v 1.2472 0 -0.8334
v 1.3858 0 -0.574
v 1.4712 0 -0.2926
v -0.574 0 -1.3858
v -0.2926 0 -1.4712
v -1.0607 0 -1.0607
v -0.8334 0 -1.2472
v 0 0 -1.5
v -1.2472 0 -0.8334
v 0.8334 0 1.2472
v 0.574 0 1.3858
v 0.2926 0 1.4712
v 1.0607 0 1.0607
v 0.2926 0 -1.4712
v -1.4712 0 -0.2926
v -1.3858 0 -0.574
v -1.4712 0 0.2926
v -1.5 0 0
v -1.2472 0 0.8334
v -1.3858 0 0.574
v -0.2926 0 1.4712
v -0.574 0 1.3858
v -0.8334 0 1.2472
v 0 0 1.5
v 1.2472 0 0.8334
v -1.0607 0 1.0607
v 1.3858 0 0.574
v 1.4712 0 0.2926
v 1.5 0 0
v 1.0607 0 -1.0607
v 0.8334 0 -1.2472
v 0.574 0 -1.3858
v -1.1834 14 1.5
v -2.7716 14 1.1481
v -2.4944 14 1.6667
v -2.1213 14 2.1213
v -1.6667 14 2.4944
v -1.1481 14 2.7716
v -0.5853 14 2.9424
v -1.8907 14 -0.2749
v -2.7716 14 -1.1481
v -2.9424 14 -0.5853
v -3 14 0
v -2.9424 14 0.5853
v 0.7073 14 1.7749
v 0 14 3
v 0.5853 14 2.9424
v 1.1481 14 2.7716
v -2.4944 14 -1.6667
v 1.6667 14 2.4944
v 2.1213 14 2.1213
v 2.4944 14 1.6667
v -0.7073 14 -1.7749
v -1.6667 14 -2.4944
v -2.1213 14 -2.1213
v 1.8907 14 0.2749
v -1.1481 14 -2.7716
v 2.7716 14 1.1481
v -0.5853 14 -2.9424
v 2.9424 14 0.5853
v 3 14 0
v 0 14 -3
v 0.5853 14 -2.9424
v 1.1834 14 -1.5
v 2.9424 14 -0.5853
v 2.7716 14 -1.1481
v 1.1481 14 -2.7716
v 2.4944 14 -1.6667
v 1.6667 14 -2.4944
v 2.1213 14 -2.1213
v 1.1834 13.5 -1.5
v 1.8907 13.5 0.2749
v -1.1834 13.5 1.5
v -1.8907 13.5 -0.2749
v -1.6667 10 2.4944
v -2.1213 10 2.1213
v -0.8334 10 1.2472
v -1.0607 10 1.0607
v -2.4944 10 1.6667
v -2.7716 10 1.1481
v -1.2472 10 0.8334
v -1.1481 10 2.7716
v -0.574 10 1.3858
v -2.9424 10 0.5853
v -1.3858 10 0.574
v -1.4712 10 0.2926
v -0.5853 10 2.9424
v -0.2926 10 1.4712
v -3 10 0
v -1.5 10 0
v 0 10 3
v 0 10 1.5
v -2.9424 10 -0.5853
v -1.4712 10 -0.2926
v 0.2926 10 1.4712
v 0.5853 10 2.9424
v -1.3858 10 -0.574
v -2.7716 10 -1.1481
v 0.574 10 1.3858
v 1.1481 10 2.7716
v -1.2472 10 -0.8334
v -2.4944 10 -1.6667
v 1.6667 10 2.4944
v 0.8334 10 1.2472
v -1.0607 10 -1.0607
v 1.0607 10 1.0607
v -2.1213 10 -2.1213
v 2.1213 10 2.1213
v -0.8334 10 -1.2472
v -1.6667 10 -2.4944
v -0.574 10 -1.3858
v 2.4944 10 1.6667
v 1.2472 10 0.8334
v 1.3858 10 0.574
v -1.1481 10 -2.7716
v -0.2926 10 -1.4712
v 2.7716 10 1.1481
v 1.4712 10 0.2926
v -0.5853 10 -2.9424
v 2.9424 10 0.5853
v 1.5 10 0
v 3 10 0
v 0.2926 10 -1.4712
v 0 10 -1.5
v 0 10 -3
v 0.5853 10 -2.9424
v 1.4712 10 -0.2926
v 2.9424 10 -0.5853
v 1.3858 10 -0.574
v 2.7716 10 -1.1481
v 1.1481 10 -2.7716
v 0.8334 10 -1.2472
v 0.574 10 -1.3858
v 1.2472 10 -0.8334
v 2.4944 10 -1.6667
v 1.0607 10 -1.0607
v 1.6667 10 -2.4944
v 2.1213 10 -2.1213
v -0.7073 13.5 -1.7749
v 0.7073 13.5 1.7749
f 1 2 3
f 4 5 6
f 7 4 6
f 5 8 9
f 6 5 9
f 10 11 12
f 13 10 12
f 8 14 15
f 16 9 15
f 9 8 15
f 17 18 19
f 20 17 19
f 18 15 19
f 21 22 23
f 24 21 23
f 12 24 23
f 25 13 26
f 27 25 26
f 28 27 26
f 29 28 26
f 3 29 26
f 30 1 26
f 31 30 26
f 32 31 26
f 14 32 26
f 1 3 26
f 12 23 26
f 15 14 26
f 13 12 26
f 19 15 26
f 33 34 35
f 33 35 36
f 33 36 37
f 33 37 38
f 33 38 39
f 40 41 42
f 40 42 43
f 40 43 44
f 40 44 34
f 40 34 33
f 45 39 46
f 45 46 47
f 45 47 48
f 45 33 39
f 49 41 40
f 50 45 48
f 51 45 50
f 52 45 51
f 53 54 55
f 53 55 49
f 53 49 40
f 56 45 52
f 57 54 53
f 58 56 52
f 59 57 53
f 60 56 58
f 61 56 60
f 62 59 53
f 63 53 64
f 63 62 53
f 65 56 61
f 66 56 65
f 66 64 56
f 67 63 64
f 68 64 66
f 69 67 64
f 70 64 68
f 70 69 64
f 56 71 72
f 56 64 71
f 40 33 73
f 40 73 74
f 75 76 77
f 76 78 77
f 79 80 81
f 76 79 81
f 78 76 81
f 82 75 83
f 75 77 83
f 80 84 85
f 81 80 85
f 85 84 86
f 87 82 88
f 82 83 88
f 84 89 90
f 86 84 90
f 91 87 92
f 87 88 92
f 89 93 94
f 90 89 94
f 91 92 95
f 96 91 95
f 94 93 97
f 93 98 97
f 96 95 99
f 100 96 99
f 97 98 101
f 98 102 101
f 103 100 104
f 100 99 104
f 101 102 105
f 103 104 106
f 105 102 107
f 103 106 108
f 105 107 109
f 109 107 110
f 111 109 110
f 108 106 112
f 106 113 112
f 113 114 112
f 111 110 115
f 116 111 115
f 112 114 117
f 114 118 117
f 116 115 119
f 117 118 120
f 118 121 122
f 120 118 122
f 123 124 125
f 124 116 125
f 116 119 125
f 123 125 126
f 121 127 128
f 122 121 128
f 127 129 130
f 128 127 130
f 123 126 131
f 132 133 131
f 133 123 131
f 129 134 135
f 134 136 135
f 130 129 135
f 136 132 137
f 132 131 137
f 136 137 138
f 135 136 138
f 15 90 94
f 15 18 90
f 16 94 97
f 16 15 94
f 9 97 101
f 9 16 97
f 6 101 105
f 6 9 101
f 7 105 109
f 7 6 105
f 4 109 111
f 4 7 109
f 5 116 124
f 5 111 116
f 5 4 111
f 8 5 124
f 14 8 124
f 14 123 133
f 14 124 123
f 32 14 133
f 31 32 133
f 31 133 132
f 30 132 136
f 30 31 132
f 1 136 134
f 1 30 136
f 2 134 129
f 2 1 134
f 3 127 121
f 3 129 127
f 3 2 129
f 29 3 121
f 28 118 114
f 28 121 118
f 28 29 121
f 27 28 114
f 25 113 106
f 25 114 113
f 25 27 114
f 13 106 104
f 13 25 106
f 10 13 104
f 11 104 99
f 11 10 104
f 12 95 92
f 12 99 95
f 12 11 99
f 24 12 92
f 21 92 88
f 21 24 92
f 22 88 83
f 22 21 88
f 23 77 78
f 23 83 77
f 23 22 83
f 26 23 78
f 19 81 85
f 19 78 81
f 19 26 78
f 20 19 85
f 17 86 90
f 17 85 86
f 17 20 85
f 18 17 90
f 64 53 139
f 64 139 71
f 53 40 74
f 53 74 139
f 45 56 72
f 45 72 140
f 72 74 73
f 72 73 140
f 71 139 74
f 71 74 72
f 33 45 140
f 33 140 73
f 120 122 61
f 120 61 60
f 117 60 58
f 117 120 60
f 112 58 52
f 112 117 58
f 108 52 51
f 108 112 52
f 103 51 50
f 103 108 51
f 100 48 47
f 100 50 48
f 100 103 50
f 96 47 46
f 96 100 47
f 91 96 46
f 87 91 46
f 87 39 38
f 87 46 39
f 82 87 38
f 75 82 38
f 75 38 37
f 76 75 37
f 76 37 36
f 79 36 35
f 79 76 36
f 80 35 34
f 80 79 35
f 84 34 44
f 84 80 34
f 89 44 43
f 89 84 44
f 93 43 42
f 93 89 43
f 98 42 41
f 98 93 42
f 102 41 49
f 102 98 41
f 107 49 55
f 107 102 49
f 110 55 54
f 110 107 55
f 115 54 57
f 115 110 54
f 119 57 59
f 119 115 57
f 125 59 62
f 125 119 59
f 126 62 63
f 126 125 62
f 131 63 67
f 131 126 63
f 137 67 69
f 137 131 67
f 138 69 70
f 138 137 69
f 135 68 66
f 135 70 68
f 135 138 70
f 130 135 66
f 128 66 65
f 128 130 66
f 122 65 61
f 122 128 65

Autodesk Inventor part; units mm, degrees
ref_plane "YZ Plane" through (0, 0, 0) normal (1, 0, 0) x (0, 1, 0)
ref_plane "XZ Plane" through (0, 0, 0) normal (0, 1, 0) x (-1, 0, 0)
ref_plane "XY Plane" through (0, 0, 0) normal (0, 0, 1) x (1, 0, 0)
sketch "Sketch1" plane through (0, 0, 0) normal (0, 1, 0) x (-1, 0, 0)
  circle A0 centre (0, 0) radius 1.5
  dimension "d0" = 3
extrude "Extrusion1" add sketch "Sketch1" along normal blind 10
sketch "Sketch2" plane through (0, 10, 0) normal (0, 1, 0) x (1, 0, 0)
  circle A0 centre (0, 0) radius 3
  dimension "d3" = 6
extrude "Extrusion2" add sketch "Sketch2" along normal blind 4
sketch "Sketch3" plane through (0, 14, 0) normal (0, 1, 0) x (1, 0, 0)
  circle A0 centre (0, 0) radius 3 projected
  line L0 (1.1834, 1.5) -> (1.8907, -0.2749)
  line L1 (1.8907, -0.2749) -> (0.7073, -1.7749)
  line L2 (0.7073, -1.7749) -> (-1.1834, -1.5)
  line L3 (-1.1834, -1.5) -> (-1.8907, 0.2749)
  line L4 (-1.8907, 0.2749) -> (-0.7073, 1.7749)
  line L5 (-0.7073, 1.7749) -> (1.1834, 1.5)
extrude "Extrusion3" cut sketch "Sketch3" against normal blind 0.5 contours L0 L1 L2 L3 L4 L5
thread "Thread1" size "M3x0.5" class "6g" standard "ANSI Metric M Profile" full length
properties part number "M4 x10"
